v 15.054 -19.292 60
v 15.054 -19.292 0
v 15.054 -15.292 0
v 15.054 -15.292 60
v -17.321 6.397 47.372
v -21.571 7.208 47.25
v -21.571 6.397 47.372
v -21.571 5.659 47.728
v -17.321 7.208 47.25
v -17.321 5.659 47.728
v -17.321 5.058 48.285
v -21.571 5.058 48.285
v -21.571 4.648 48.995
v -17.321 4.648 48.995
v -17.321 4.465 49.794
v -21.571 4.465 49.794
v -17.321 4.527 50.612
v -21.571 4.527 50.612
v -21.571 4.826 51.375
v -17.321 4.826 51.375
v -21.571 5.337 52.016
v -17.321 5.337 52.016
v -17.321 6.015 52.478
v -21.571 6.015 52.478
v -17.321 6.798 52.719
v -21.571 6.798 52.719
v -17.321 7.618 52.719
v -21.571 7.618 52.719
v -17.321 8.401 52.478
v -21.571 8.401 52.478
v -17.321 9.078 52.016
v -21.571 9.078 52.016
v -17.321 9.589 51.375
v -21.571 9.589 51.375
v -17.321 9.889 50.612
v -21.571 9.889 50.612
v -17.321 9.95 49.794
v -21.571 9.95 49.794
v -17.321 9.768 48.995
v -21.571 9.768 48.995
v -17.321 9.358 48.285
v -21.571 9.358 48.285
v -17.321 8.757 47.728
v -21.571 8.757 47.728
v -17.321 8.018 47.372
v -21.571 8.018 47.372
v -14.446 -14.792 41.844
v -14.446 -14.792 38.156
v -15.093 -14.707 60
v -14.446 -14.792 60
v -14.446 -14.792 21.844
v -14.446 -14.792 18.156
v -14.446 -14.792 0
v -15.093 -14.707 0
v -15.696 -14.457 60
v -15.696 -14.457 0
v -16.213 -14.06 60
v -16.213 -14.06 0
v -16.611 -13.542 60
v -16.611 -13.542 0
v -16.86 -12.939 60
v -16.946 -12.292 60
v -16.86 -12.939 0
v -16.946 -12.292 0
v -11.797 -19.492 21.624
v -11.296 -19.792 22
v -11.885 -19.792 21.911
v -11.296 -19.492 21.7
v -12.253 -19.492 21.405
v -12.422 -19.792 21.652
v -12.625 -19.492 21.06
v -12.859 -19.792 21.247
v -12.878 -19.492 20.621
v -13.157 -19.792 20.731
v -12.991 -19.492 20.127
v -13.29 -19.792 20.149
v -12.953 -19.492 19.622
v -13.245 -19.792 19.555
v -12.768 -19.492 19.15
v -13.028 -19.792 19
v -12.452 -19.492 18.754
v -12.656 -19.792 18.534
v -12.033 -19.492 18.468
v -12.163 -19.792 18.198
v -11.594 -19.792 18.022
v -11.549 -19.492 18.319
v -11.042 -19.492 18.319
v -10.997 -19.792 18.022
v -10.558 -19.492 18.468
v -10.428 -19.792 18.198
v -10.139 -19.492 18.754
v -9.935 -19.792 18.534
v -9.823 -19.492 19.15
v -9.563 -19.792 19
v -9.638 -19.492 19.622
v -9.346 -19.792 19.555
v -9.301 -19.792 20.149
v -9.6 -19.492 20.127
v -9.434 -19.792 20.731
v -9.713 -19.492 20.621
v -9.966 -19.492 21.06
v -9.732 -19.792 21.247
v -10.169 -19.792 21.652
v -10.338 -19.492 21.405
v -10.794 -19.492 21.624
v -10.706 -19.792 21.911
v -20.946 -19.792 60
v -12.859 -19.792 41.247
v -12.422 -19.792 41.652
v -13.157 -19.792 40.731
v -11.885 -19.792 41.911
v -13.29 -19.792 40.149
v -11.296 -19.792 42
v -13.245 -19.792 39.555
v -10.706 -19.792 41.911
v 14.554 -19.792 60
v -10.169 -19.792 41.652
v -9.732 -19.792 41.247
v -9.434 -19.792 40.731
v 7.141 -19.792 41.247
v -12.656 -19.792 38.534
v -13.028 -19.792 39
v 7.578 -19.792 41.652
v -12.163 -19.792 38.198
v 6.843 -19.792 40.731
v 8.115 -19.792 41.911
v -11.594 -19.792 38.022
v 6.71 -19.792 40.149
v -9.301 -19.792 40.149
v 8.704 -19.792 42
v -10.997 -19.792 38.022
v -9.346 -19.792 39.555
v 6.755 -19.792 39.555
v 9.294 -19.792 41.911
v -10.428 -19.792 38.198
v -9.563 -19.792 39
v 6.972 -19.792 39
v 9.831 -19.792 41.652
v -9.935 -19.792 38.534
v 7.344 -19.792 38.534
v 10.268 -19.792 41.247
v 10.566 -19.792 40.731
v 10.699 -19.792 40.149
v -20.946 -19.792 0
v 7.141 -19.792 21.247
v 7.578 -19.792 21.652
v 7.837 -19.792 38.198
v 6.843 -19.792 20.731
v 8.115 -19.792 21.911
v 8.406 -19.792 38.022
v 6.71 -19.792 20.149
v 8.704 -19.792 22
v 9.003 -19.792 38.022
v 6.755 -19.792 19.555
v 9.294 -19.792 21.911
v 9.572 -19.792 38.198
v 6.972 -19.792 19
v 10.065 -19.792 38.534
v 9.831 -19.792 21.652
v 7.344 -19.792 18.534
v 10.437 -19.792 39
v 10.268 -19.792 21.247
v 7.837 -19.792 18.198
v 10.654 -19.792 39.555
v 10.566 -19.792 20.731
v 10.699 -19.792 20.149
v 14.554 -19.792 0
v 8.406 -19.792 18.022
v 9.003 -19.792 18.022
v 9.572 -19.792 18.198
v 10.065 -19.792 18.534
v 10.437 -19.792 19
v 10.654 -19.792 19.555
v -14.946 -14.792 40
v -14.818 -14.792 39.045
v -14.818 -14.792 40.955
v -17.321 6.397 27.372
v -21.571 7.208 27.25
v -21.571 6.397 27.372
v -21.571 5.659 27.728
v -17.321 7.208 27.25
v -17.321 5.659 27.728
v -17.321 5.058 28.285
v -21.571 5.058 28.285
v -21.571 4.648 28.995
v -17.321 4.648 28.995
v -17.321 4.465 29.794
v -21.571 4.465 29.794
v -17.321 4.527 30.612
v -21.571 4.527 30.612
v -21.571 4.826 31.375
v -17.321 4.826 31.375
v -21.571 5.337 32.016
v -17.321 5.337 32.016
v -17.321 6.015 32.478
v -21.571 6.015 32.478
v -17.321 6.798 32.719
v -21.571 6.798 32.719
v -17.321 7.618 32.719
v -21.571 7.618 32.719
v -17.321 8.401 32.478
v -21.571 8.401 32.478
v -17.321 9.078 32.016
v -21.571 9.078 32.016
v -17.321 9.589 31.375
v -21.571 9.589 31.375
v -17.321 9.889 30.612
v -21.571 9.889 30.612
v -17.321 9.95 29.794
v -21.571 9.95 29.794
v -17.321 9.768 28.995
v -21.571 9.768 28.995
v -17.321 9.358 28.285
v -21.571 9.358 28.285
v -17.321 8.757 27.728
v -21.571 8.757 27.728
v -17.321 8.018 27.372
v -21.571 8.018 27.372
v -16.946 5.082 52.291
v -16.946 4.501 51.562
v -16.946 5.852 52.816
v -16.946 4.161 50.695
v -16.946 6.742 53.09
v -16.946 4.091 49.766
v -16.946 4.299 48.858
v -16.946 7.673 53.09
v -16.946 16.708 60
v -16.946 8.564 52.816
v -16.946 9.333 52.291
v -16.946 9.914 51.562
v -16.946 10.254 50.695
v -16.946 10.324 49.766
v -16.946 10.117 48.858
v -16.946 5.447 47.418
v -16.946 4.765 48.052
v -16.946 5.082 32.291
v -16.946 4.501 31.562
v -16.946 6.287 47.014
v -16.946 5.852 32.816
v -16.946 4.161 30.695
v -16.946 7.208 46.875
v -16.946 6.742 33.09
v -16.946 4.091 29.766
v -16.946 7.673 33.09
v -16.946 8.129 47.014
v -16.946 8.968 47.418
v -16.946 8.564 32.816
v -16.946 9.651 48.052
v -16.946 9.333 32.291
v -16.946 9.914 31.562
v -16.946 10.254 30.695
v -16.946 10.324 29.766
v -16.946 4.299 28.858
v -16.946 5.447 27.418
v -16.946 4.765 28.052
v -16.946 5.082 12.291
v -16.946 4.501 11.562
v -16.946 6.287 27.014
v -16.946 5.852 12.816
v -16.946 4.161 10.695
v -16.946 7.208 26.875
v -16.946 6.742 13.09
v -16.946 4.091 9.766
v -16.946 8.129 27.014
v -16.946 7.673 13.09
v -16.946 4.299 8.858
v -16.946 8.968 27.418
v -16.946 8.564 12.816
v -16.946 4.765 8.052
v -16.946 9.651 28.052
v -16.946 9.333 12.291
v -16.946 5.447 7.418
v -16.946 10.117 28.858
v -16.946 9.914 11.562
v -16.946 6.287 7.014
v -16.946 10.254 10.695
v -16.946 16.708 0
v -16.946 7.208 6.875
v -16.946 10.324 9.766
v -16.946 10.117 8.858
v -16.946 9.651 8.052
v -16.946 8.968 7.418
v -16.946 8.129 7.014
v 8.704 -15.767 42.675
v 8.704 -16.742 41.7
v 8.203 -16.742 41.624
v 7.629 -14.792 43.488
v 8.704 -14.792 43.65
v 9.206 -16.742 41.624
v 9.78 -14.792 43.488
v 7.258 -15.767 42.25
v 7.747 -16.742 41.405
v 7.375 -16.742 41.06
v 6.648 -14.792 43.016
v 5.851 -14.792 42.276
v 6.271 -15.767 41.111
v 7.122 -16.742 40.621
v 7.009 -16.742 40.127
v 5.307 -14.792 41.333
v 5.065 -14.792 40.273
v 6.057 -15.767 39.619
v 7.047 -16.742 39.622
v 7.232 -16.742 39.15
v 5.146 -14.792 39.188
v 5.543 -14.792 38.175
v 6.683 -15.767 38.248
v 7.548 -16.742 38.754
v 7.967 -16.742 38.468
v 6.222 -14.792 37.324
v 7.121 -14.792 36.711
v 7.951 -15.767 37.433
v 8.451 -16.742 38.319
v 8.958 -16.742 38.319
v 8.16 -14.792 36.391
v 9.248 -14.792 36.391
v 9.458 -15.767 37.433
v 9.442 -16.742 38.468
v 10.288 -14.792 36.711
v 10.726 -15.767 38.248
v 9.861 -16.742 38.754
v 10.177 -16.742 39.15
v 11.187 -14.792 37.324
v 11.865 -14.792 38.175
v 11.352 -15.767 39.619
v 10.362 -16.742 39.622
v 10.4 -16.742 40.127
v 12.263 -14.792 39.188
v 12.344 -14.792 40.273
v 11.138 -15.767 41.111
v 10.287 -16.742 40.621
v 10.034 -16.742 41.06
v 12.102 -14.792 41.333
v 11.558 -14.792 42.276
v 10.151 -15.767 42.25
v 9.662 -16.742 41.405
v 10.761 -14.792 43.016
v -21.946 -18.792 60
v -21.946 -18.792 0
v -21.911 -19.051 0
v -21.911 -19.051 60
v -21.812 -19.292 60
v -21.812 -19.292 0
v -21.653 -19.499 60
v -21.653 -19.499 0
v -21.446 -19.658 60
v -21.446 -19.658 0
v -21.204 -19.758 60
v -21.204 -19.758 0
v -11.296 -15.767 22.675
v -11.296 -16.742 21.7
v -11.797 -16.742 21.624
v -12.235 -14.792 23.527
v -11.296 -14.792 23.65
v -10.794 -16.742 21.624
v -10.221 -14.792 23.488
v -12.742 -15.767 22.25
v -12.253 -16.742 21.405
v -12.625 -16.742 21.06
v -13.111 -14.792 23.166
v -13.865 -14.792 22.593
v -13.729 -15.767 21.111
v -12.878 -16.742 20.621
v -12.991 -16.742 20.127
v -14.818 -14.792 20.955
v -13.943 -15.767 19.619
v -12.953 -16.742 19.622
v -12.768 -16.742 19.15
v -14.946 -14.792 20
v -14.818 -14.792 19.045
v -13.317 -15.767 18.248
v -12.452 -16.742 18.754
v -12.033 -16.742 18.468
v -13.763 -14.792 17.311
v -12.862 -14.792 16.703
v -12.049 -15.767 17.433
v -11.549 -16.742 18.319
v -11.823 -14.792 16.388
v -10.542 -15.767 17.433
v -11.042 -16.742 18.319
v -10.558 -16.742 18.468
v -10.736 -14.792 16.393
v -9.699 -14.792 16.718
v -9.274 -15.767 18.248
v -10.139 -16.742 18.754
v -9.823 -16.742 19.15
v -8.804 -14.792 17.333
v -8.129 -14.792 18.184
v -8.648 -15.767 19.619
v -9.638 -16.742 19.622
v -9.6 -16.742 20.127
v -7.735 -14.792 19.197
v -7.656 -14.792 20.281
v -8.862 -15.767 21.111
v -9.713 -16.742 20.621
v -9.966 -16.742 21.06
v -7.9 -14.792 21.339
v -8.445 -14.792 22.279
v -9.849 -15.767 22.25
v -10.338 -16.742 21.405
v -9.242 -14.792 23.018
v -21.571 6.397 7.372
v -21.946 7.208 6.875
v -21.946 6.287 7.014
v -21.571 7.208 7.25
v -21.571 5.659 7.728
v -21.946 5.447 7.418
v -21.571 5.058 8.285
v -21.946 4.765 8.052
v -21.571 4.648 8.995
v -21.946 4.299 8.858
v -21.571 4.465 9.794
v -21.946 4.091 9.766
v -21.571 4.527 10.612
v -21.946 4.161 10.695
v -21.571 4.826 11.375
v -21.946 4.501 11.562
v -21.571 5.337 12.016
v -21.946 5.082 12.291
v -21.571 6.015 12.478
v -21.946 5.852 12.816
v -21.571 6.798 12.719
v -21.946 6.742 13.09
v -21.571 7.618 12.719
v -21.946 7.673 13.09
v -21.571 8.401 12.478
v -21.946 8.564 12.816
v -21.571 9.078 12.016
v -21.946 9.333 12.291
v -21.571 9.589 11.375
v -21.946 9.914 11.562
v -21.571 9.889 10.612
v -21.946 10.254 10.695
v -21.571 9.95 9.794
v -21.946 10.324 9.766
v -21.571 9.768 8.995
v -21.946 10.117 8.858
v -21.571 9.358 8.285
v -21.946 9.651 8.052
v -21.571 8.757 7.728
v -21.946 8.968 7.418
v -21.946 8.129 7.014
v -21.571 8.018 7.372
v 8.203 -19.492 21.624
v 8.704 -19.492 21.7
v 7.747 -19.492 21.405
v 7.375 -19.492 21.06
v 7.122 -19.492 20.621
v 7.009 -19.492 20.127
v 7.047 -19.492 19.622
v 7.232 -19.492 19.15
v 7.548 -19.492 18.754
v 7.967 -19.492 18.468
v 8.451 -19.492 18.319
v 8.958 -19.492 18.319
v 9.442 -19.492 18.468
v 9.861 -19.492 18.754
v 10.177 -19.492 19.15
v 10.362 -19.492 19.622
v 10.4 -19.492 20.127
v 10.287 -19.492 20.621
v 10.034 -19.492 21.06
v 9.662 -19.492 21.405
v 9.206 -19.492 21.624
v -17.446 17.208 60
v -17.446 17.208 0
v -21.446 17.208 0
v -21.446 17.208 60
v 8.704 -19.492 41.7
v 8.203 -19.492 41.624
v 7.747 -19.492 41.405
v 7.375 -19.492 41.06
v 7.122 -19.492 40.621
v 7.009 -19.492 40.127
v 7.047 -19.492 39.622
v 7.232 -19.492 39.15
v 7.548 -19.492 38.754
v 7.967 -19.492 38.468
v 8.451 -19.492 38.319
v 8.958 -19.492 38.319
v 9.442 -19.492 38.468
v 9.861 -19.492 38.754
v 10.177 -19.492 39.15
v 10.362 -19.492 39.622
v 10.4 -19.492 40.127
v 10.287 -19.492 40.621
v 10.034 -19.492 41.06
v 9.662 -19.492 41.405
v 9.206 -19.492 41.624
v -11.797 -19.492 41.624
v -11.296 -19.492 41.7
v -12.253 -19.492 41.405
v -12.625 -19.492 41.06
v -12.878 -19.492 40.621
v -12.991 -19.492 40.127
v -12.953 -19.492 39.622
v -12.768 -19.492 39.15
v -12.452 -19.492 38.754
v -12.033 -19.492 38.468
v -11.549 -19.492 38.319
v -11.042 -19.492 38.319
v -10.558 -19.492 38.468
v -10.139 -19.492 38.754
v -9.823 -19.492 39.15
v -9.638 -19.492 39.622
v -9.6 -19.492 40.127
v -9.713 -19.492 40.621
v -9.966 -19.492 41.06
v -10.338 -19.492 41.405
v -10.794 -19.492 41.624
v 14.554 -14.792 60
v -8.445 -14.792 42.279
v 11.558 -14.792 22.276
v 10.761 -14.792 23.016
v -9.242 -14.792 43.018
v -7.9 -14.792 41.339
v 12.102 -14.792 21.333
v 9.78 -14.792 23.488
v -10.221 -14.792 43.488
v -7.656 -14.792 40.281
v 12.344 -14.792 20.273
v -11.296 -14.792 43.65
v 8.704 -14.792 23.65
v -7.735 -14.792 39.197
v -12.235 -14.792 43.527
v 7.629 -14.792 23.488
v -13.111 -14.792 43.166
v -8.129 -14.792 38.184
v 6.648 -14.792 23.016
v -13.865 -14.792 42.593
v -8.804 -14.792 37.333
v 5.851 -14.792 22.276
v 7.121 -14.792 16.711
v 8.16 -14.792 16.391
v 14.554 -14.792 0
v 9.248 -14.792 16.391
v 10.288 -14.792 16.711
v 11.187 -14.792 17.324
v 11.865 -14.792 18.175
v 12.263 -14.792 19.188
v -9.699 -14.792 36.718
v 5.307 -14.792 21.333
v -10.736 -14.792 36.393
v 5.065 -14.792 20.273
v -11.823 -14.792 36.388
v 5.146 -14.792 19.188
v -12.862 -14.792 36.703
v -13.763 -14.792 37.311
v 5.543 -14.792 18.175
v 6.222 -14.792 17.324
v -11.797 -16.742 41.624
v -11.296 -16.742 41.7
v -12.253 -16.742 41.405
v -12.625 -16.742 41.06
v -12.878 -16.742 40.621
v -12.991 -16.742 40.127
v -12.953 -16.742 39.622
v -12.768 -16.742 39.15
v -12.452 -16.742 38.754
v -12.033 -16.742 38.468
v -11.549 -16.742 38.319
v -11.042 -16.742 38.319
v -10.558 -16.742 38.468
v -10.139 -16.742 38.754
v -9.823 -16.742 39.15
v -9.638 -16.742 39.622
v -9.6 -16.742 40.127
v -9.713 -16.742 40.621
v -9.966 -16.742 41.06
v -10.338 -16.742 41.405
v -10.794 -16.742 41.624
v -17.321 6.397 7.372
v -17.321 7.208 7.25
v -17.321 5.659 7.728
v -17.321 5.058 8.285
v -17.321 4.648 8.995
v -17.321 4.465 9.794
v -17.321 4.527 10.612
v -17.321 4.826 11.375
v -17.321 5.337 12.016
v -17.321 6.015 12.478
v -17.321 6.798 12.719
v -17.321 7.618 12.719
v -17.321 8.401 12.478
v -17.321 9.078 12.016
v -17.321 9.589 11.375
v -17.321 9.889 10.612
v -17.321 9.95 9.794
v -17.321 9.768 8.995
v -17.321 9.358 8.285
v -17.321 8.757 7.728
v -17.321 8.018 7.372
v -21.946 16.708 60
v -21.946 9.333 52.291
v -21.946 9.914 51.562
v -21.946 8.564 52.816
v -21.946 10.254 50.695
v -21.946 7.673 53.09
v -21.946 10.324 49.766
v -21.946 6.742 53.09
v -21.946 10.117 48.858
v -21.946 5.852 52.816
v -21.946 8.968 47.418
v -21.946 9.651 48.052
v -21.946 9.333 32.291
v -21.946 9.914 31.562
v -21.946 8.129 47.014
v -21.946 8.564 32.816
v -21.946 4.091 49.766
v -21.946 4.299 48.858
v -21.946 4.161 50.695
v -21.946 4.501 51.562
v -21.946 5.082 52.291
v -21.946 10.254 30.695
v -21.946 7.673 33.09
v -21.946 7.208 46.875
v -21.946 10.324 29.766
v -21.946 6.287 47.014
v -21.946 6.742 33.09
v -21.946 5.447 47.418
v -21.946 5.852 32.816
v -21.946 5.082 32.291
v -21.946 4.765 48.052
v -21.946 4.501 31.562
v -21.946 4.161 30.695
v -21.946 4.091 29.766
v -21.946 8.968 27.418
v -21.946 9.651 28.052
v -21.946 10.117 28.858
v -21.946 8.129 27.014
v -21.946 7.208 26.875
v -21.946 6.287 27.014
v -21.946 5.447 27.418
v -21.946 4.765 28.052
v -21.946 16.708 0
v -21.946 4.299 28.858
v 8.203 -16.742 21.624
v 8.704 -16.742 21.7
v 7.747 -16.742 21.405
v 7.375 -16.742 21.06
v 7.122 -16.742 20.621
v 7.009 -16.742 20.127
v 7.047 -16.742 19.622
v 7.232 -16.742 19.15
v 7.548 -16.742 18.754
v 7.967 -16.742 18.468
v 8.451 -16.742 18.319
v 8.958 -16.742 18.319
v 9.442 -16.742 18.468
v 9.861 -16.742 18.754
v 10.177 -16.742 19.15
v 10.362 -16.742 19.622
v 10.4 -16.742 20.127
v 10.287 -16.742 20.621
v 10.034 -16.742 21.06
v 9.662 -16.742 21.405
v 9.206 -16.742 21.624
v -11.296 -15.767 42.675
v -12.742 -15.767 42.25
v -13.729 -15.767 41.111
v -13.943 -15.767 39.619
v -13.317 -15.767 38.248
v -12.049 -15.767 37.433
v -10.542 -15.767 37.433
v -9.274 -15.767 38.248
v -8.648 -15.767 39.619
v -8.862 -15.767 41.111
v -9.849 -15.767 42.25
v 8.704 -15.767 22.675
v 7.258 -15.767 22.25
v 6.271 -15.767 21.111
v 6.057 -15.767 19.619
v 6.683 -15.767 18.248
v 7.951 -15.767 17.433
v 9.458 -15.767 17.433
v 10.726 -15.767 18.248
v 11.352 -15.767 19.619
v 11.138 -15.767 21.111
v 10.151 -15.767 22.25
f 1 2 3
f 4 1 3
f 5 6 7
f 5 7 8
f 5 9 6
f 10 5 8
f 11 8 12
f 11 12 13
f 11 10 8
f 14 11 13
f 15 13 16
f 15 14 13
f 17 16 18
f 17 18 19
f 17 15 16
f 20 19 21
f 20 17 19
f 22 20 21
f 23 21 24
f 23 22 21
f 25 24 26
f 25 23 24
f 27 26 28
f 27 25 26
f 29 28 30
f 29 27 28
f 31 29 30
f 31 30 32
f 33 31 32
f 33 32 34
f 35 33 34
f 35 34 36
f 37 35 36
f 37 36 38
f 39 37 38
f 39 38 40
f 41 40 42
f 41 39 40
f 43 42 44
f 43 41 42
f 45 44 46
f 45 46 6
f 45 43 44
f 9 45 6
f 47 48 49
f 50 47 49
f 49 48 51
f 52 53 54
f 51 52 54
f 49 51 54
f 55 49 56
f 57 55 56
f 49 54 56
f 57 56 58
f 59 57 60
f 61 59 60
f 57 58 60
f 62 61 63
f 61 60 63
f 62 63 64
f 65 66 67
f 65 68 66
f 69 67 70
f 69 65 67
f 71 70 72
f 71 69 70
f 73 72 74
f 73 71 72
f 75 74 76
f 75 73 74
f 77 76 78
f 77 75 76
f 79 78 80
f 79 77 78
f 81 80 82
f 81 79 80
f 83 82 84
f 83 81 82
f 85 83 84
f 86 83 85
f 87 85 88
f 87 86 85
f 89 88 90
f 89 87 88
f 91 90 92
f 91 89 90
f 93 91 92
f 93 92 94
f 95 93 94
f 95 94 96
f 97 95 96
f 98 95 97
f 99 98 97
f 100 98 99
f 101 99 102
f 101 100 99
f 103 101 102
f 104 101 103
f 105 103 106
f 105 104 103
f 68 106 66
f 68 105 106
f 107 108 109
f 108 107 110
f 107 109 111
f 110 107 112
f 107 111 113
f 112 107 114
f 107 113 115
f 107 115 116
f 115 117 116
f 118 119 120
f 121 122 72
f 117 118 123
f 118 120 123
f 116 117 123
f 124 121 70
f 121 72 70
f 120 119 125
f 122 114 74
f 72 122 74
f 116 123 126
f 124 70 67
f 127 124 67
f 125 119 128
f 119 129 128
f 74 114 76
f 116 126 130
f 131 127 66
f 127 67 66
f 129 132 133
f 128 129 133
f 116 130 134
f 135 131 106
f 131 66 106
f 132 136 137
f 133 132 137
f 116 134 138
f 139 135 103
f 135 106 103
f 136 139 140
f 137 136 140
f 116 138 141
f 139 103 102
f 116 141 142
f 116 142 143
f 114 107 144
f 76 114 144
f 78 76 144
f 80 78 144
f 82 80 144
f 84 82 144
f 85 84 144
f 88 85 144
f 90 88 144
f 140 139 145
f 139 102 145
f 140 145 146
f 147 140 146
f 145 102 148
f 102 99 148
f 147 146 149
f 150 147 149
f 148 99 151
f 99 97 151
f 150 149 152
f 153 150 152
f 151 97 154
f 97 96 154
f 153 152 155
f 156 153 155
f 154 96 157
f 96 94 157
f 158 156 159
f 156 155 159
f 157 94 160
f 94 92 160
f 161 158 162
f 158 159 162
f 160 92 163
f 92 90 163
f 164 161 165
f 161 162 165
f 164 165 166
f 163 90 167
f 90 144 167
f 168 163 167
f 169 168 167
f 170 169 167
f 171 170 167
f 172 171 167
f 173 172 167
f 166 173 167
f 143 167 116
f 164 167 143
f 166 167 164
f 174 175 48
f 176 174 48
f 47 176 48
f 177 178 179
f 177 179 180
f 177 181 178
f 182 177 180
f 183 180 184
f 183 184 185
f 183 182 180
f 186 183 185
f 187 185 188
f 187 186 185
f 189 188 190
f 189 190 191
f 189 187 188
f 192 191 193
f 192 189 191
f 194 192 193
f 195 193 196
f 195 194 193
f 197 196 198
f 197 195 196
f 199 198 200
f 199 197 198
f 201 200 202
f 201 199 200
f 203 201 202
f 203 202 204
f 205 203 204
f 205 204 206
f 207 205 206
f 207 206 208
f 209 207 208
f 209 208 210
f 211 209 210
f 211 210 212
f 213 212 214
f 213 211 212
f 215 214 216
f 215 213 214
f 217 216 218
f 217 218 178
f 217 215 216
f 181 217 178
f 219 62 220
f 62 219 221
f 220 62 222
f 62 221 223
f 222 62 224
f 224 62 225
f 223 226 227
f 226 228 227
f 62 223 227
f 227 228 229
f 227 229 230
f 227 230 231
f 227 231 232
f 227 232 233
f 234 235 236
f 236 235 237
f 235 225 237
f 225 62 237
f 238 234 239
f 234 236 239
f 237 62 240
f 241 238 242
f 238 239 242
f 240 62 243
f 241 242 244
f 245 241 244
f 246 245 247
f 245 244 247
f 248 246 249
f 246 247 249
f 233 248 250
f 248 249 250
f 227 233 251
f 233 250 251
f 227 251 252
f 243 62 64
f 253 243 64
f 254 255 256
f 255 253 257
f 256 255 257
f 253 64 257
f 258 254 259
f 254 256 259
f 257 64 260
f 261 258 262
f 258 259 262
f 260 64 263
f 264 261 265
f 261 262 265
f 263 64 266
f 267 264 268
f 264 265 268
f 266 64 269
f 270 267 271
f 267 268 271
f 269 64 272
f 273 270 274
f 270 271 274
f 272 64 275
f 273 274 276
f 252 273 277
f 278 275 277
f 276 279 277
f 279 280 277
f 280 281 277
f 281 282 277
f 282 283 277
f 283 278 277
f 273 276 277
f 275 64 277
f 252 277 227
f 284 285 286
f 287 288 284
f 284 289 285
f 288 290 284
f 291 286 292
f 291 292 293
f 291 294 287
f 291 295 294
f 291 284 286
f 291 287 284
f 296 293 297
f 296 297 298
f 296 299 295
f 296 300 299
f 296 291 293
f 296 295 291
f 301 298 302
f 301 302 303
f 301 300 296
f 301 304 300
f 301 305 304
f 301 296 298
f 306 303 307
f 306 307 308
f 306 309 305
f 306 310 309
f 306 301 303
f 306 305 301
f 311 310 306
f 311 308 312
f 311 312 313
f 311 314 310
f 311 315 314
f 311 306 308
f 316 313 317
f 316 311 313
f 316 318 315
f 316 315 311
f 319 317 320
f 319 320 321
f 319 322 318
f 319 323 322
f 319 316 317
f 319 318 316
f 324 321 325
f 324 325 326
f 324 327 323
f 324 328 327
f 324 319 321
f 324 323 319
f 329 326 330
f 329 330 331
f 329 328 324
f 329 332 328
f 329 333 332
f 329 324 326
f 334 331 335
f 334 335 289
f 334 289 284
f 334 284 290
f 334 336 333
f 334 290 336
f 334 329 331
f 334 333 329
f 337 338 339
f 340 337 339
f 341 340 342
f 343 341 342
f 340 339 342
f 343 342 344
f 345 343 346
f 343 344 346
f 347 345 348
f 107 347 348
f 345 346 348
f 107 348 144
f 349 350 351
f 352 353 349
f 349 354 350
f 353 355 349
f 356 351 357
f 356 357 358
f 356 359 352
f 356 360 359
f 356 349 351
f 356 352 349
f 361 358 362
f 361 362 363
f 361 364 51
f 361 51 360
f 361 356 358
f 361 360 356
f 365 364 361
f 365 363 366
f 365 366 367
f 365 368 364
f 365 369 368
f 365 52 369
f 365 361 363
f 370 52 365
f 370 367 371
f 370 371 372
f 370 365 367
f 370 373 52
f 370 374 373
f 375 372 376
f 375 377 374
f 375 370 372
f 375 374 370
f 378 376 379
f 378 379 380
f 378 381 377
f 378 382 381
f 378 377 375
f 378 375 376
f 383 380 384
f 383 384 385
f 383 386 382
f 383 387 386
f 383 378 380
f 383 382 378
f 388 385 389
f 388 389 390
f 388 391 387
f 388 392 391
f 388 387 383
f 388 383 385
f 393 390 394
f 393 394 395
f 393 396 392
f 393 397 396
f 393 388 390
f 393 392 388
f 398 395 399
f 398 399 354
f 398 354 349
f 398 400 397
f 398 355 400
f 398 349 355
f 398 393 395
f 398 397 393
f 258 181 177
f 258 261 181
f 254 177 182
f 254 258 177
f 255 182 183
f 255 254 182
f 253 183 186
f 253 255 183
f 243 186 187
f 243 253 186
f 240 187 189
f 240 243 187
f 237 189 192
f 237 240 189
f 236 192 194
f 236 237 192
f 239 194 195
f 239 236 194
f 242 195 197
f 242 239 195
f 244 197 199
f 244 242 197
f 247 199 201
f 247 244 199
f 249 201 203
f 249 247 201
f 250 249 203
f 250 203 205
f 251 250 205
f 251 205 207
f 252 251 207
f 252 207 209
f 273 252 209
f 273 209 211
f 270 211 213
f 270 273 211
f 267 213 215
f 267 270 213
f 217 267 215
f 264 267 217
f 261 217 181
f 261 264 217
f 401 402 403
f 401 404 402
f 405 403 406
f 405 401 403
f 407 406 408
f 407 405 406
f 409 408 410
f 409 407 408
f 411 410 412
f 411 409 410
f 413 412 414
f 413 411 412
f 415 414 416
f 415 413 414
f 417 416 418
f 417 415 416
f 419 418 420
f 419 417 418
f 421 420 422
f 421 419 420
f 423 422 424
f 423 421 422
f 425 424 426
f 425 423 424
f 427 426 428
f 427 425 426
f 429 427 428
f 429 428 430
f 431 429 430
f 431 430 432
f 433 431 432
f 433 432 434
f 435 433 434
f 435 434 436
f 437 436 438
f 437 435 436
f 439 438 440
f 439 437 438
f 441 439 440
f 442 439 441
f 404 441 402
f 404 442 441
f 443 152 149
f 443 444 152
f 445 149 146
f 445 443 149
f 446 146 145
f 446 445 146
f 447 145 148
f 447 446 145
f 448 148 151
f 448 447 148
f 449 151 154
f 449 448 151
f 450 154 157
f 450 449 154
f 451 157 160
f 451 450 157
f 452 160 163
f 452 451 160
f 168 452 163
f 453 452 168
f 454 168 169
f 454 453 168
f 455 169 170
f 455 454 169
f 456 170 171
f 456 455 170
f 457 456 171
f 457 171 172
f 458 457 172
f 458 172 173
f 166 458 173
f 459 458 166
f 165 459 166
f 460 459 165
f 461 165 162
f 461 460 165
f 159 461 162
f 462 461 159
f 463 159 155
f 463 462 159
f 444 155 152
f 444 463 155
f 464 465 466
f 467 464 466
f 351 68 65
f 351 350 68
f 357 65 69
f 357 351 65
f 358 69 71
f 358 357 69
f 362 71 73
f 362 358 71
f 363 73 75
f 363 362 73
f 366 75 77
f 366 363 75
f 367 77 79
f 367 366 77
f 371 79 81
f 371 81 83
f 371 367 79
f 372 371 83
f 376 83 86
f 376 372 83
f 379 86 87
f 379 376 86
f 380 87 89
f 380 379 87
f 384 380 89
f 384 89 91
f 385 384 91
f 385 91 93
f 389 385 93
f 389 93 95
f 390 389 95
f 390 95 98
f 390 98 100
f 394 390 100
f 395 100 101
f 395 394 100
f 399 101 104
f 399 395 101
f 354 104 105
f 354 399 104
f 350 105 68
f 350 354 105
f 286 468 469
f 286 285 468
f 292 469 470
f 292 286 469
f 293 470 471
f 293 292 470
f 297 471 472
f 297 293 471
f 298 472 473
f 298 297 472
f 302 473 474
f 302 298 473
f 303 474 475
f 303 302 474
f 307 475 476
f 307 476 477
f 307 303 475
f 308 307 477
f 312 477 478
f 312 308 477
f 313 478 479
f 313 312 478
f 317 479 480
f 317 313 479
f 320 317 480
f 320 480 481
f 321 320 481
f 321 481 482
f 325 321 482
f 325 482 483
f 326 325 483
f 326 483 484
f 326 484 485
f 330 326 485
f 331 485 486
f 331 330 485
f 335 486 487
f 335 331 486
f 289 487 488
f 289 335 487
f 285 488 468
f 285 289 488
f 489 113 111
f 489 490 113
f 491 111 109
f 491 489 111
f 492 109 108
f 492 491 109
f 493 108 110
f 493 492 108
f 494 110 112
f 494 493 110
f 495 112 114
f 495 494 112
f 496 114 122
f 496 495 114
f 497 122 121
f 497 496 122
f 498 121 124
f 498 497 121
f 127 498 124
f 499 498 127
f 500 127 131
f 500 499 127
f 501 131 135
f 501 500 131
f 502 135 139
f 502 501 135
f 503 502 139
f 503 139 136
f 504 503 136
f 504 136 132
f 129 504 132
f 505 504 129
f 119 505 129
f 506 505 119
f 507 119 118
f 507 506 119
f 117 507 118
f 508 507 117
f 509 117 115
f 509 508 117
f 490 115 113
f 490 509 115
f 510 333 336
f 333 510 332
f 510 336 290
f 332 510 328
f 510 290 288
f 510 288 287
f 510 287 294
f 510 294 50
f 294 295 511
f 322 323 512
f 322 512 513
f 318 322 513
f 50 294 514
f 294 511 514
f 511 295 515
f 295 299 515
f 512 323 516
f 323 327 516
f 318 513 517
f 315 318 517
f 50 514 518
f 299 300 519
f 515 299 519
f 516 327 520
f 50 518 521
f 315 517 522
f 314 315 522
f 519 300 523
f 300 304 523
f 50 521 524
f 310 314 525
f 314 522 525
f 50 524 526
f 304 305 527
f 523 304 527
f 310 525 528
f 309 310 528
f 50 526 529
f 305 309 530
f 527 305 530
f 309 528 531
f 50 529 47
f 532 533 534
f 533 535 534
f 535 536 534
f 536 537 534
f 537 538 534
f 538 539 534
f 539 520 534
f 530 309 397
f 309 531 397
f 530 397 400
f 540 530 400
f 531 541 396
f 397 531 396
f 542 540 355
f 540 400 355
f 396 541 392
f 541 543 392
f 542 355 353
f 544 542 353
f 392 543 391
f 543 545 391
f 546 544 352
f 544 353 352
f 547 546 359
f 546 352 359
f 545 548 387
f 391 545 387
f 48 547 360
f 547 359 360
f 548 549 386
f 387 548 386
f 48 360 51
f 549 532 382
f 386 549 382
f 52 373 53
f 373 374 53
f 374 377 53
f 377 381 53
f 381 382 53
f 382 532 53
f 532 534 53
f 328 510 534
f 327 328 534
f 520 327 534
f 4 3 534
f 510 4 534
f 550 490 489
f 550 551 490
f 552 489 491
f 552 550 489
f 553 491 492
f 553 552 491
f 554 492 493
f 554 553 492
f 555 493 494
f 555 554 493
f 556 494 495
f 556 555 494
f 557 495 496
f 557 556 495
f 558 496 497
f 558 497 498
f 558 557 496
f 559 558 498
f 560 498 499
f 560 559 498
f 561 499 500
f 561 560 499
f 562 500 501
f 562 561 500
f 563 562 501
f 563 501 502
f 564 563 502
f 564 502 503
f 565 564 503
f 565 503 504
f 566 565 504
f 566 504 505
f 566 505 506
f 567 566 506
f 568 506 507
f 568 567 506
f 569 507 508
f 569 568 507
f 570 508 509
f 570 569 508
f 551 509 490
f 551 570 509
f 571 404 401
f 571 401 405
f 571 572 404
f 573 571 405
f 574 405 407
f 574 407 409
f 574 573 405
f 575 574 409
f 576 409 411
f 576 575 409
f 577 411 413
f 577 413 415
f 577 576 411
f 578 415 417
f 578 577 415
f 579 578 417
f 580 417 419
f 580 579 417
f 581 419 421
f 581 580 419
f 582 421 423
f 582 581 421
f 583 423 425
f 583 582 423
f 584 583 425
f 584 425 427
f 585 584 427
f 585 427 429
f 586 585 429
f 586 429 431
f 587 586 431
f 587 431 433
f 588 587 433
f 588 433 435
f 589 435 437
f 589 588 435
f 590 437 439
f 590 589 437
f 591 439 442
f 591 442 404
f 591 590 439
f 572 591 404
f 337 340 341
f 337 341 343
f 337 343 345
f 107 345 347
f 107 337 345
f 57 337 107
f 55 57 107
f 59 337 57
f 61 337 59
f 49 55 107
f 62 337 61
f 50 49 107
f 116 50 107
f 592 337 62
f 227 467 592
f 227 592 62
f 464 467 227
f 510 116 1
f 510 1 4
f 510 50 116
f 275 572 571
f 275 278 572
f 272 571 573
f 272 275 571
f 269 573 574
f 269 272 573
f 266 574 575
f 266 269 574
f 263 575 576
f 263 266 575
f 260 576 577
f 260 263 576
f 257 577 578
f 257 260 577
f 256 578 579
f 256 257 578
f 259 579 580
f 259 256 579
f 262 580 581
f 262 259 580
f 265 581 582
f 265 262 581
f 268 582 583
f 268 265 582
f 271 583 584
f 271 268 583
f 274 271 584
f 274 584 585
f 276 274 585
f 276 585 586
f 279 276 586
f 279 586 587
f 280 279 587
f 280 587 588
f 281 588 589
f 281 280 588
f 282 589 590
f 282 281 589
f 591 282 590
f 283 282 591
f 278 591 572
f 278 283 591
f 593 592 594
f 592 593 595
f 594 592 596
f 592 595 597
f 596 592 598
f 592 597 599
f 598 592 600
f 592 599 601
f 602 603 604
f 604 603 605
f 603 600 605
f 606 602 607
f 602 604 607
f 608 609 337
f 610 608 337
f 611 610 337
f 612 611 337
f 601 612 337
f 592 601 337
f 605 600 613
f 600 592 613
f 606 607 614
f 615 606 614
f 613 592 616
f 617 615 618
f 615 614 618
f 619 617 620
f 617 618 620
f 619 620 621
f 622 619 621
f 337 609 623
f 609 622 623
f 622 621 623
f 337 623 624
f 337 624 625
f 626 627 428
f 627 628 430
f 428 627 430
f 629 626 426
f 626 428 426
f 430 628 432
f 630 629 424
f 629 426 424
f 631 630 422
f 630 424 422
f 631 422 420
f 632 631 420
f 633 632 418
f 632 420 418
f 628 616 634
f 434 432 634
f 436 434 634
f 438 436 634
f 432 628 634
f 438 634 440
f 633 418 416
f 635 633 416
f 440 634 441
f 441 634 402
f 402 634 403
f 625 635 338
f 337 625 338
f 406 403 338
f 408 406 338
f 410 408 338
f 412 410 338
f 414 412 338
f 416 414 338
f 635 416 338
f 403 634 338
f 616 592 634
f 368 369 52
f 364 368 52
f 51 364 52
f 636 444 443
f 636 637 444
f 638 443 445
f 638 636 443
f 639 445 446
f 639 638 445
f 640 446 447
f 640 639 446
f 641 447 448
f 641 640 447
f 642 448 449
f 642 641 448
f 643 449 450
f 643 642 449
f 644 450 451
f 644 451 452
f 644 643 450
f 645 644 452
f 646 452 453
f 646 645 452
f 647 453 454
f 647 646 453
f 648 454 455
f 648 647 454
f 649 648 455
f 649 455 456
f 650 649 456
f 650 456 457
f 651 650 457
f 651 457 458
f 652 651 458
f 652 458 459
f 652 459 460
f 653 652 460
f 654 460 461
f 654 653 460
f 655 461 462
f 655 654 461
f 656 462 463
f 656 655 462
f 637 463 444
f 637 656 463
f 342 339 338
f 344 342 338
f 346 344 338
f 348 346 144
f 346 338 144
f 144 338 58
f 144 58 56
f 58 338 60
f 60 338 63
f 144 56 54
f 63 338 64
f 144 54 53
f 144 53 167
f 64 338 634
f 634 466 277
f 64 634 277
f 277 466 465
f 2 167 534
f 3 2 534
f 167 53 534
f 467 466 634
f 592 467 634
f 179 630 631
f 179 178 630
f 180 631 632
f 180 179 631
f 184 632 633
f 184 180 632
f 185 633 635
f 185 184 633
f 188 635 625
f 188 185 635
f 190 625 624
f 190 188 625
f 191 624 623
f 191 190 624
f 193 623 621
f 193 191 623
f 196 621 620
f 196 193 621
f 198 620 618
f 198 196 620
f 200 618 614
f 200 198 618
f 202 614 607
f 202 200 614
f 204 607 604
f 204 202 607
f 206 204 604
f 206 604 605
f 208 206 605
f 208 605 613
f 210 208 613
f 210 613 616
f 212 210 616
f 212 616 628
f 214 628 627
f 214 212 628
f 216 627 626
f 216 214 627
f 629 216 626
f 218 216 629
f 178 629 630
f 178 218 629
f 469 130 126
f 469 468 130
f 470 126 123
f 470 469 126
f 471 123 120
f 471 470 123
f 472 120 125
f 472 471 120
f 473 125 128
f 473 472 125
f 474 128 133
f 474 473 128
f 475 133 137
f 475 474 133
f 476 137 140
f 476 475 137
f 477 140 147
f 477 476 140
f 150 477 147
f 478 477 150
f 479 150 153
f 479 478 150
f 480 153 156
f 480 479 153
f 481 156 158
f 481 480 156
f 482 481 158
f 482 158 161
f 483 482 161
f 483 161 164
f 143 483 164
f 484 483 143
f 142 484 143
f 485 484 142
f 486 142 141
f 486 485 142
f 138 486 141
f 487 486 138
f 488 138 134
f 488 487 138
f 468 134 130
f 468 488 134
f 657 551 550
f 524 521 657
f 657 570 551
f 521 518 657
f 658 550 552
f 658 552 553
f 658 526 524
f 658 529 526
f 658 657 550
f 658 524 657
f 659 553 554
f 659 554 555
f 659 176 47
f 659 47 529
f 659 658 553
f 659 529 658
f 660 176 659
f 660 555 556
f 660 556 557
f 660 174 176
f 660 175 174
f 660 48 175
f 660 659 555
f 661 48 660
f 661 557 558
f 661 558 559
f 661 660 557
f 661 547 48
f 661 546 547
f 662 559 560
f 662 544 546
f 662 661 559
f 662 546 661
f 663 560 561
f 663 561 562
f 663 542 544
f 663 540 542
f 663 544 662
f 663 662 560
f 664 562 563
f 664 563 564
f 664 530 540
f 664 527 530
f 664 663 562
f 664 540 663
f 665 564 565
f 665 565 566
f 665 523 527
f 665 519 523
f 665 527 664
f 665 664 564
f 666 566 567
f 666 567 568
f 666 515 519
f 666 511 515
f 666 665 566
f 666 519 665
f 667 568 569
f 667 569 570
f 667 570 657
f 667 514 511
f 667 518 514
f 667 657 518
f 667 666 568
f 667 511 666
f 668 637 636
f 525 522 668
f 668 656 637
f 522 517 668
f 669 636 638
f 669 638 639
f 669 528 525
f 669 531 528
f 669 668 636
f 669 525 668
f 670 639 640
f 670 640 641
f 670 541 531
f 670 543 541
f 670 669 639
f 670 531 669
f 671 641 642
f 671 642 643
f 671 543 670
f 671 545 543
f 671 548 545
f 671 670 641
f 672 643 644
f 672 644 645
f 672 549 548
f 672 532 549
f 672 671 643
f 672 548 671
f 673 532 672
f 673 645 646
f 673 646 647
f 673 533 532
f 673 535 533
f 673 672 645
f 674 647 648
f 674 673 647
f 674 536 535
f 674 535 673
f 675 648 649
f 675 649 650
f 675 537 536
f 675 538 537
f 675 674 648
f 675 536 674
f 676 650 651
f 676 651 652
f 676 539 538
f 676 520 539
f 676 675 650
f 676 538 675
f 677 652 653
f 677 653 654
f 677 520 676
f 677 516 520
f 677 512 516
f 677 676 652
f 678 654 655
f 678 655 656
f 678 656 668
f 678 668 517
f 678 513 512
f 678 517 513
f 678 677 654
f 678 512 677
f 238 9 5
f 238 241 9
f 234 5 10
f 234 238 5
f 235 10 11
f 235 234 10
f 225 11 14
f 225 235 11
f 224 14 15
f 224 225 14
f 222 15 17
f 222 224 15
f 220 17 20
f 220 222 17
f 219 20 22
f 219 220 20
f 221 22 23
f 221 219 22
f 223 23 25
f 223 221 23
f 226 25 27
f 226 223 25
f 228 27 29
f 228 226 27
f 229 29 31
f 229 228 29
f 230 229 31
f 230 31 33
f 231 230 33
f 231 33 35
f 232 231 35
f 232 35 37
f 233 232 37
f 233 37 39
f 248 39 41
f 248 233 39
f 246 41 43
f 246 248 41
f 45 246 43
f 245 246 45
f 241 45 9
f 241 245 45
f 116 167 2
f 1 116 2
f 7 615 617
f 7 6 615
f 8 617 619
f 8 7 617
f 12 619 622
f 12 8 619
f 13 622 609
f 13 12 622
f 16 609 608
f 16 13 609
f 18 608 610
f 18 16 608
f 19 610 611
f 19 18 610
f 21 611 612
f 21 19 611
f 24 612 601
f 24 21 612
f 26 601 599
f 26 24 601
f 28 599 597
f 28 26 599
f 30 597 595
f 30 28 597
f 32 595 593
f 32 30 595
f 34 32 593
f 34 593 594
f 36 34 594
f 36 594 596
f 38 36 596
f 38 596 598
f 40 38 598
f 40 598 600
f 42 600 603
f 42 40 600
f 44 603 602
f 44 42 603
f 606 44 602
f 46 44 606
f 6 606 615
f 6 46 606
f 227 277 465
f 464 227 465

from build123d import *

# Parameters (mm, degrees)
BOSS_EXTRUDE1_DEPTH                            = 60
CSK_FOR_M3_FLAT_HEAD_MACHINE_SCREW1_AT_2_COUNT = 2
CSK_FOR_M3_FLAT_HEAD_MACHINE_SCREW1_AT_2_PITCH = 20
CSK_FOR_M3_FLAT_HEAD_MACHINE_SCREW1_AT_3_COUNT = 2
CSK_FOR_M3_FLAT_HEAD_MACHINE_SCREW1_AT_3_PITCH = 28.284271247
CSK_FOR_M3_FLAT_HEAD_MACHINE_SCREW1_AT_4_COUNT = 2
CSK_FOR_M3_FLAT_HEAD_MACHINE_SCREW1_AT_4_PITCH = 20
M5_CLEARANCE_HOLE1_AT_2_COUNT                  = 2
M5_CLEARANCE_HOLE1_AT_2_PITCH                  = 20
M5_CLEARANCE_HOLE1_AT_3_COUNT                  = 2
M5_CLEARANCE_HOLE1_AT_3_PITCH                  = 40


with BuildPart() as part:
    # Sketch1 → Boss-Extrude1 (new body)
    with BuildSketch(Plane.XY):
        with BuildLine():
            Line((-21.945528184, 16.707726181), (-21.945528184, -18.792273819))
            ThreePointArc((-21.945528184, -18.792273819), (-21.652634965, -19.4993806), (-20.945528184, -19.792273819))
            Line((-20.945528184, -19.792273819), (14.554471816, -19.792273819))
            Line((14.554471816, -19.792273819), (15.054471816, -19.292273819))
            Line((15.054471816, -19.292273819), (15.054471816, -15.292273819))
            Line((15.054471816, -15.292273819), (14.554471816, -14.792273819))
            Line((14.554471816, -14.792273819), (-14.445528184, -14.792273819))
            ThreePointArc((-14.445528184, -14.792273819), (-16.213295137, -14.060040772), (-16.945528184, -12.292273819))
            Line((-16.945528184, -12.292273819), (-16.945528184, 16.707726181))
            Line((-16.945528184, 16.707726181), (-17.445528184, 17.207726181))
            Line((-17.445528184, 17.207726181), (-21.445528184, 17.207726181))
            Line((-21.445528184, 17.207726181), (-21.945528184, 16.707726181))
        make_face()
    extrude(amount=BOSS_EXTRUDE1_DEPTH)

    # Sketch3 → CSK for M3 Flat Head Machine Screw1 (revolve, cut)
    with BuildSketch(Plane(origin=(-11.295528184, -14.792273819, 40), x_dir=(0, 0, 1), z_dir=(1, 0, 0))):
        Polygon((0, 0), (0, 5), (2, 5), (1.7, 4.7), (1.7, 1.95), (3.65, 0), align=None)
    csk_for_m3_flat_head_machine_screw1 = revolve(axis=Axis((-11.295528184, -8.442273819, 40), (0, -1, 0)), mode=Mode.SUBTRACT)

    # CSK for M3 Flat Head Machine Screw1 at 2: CSK for M3 Flat Head Machine Screw1 ×2
    with Locations(*[(i * CSK_FOR_M3_FLAT_HEAD_MACHINE_SCREW1_AT_2_PITCH, 0, 0) for i in range(1, CSK_FOR_M3_FLAT_HEAD_MACHINE_SCREW1_AT_2_COUNT)]):
        add(csk_for_m3_flat_head_machine_screw1, mode=Mode.SUBTRACT)

    # CSK for M3 Flat Head Machine Screw1 at 3: CSK for M3 Flat Head Machine Screw1 ×2
    with Locations(*[Vector(0.7071067811865475, 0, -0.7071067811865476) * (i * CSK_FOR_M3_FLAT_HEAD_MACHINE_SCREW1_AT_3_PITCH) for i in range(1, CSK_FOR_M3_FLAT_HEAD_MACHINE_SCREW1_AT_3_COUNT)]):
        add(csk_for_m3_flat_head_machine_screw1, mode=Mode.SUBTRACT)

    # CSK for M3 Flat Head Machine Screw1 at 4: CSK for M3 Flat Head Machine Screw1 ×2
    with Locations(*[(0, 0, -i * CSK_FOR_M3_FLAT_HEAD_MACHINE_SCREW1_AT_4_PITCH) for i in range(1, CSK_FOR_M3_FLAT_HEAD_MACHINE_SCREW1_AT_4_COUNT)]):
        add(csk_for_m3_flat_head_machine_screw1, mode=Mode.SUBTRACT)

    # Sketch5 → M5 Clearance Hole1 (revolve, cut)
    with BuildSketch(Plane(origin=(-16.945528184, 7.207726181, 50), x_dir=(0, 0, -1), z_dir=(0, 1, 0))):
        Polygon((0, 0), (0, 5), (3.125, 5), (2.75, 4.625), (2.75, 0.375), (3.125, 0), align=None)
    m5_clearance_hole1 = revolve(axis=Axis((-10.595528184, 7.207726181, 50), (-1, 0, 0)), mode=Mode.SUBTRACT)

    # M5 Clearance Hole1 at 2: M5 Clearance Hole1 ×2
    with Locations(*[(0, 0, -i * M5_CLEARANCE_HOLE1_AT_2_PITCH) for i in range(1, M5_CLEARANCE_HOLE1_AT_2_COUNT)]):
        add(m5_clearance_hole1, mode=Mode.SUBTRACT)

    # M5 Clearance Hole1 at 3: M5 Clearance Hole1 ×2
    with Locations(*[(0, 0, -i * M5_CLEARANCE_HOLE1_AT_3_PITCH) for i in range(1, M5_CLEARANCE_HOLE1_AT_3_COUNT)]):
        add(m5_clearance_hole1, mode=Mode.SUBTRACT)


solid = part.part
